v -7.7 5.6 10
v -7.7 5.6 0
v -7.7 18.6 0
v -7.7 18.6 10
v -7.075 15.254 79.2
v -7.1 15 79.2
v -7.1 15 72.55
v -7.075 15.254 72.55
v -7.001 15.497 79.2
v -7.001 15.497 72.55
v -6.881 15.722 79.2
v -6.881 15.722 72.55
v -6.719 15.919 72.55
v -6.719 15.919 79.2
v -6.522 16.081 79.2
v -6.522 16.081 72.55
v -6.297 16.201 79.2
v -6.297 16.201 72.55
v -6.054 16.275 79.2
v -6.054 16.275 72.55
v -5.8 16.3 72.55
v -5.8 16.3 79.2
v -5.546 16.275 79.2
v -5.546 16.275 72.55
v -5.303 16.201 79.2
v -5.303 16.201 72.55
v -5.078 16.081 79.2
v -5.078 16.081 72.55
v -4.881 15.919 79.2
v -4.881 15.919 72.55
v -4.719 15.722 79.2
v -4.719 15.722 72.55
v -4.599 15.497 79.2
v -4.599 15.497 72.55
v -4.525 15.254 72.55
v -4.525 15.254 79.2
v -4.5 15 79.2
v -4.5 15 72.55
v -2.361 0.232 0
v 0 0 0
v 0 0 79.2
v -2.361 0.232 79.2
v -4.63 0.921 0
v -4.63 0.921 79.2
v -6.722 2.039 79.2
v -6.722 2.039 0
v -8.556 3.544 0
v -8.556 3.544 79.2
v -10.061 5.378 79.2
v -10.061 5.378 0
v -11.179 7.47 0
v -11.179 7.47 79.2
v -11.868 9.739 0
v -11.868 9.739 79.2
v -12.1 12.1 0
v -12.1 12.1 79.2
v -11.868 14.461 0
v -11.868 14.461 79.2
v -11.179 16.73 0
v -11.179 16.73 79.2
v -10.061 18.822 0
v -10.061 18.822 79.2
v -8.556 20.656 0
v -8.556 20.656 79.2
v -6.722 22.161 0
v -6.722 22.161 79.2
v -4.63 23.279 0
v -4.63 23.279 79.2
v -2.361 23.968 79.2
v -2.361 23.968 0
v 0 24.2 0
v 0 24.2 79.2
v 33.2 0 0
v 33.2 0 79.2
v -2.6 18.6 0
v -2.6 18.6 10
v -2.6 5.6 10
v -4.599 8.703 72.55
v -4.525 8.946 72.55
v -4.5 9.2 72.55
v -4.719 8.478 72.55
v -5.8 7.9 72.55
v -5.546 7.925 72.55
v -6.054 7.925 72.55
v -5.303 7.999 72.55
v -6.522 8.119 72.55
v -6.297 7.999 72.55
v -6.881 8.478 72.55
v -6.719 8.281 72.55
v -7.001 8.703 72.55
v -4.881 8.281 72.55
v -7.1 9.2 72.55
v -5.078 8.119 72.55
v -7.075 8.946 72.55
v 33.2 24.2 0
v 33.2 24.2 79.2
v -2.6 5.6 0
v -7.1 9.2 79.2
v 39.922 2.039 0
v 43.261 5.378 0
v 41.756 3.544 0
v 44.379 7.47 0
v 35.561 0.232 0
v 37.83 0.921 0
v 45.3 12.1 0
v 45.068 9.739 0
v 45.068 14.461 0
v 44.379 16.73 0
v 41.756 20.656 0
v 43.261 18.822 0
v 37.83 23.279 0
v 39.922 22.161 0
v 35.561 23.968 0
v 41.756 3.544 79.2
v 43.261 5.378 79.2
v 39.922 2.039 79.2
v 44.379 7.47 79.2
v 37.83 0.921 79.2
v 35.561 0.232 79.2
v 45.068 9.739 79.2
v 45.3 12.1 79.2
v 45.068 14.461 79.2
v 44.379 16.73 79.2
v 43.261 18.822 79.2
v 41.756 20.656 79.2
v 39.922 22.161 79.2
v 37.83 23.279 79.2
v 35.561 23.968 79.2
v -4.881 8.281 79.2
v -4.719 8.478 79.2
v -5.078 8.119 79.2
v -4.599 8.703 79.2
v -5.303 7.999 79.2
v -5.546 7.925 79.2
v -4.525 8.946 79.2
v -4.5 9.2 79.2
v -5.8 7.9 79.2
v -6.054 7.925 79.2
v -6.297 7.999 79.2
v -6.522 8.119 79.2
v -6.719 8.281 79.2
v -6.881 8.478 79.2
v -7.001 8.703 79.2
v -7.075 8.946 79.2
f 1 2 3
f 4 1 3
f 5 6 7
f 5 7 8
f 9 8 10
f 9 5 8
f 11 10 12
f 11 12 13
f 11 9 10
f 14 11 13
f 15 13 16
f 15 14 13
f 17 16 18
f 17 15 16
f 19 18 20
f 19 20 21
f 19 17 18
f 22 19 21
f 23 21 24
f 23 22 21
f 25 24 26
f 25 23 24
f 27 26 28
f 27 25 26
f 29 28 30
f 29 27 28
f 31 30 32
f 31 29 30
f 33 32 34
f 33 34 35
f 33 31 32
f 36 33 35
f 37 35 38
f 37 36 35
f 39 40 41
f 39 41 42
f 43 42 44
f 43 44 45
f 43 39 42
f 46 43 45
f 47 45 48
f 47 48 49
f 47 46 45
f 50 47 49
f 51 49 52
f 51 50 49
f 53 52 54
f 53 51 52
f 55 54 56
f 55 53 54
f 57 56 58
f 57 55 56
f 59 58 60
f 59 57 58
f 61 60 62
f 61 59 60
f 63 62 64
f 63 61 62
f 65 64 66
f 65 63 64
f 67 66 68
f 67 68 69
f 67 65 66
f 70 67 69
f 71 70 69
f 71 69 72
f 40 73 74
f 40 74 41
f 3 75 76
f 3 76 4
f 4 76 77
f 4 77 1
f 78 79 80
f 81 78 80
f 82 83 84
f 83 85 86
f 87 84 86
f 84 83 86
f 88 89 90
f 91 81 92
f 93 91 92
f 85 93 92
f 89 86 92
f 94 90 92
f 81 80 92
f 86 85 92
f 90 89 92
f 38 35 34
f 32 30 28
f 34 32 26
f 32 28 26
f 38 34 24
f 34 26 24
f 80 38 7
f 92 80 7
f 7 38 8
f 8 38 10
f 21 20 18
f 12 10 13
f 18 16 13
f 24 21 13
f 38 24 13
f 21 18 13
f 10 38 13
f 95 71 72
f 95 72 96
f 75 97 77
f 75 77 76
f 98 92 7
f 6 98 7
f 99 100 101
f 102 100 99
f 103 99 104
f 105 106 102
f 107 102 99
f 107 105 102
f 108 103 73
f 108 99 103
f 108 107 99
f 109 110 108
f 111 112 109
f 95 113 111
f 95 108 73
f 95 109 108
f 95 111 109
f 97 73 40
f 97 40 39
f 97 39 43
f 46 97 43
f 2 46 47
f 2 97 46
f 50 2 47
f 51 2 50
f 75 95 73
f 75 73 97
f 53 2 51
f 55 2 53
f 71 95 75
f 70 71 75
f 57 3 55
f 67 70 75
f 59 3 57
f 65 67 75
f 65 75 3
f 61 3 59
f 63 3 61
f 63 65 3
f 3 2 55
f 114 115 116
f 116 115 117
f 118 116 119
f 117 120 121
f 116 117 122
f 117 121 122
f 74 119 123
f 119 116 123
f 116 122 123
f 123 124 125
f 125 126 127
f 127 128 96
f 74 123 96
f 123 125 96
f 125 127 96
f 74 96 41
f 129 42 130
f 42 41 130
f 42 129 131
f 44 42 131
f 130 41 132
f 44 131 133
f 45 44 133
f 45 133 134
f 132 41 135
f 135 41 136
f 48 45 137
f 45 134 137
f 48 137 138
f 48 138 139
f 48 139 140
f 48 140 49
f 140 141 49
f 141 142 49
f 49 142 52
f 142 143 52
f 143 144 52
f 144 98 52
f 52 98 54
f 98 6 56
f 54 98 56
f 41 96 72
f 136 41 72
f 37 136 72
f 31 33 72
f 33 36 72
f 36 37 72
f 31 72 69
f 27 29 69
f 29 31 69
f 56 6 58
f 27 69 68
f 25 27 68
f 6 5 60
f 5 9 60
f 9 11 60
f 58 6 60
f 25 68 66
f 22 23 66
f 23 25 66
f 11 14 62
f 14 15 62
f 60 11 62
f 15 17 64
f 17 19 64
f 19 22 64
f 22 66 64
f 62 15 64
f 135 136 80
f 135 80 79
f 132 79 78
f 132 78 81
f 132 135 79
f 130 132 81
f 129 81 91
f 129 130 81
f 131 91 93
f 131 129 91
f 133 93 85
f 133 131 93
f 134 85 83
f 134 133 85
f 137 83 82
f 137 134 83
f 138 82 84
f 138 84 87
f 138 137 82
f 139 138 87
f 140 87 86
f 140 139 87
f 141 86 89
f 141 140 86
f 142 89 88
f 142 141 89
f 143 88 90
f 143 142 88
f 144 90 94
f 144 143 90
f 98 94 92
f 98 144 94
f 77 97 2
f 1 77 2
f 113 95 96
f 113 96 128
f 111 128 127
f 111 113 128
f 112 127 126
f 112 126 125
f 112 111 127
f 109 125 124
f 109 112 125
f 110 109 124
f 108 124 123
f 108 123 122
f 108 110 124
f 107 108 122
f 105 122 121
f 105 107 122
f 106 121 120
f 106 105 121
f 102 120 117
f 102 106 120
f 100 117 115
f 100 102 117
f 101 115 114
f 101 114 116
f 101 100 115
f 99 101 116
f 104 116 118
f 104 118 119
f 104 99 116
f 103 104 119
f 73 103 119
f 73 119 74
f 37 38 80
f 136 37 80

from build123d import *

# Parameters (mm, degrees)
P_IDAT_VYSUNUT_M1_DEPTH  = 79.2
SKICA2_W                 = 5.1
SKICA2_H                 = 13
ODEBRAT_VYSUNUT_M1_DEPTH = 10
ODEBRAT_VYSUNUT_M2_DEPTH = 6.65


with BuildPart() as part:
    # Skica1 → Přidat vysunutím1 (new body)
    with BuildSketch(Plane.XY):
        with BuildLine():
            Line((0, 24.2), (33.2, 24.2))
            ThreePointArc((33.2, 24.2), (45.3, 12.1), (33.2, 0))
            Line((33.2, 0), (0, 0))
            ThreePointArc((0, 0), (-12.1, 12.1), (0, 24.2))
        make_face()
    extrude(amount=P_IDAT_VYSUNUT_M1_DEPTH)

    # Skica2 → Odebrat vysunutím1 (cut)
    with BuildSketch(Plane(origin=(0, 0, 0), x_dir=(-1, 0, 0), z_dir=(0, 0, -1))):
        with Locations((5.15, 12.1)):
            Rectangle(SKICA2_W, SKICA2_H)
    extrude(amount=-ODEBRAT_VYSUNUT_M1_DEPTH, mode=Mode.SUBTRACT)

    # Skica3 → Odebrat vysunutím2 (cut)
    with BuildSketch(Plane.XY.offset(79.2)):
        with BuildLine():
            Line((-7.1, 9.2), (-7.1, 15))
            ThreePointArc((-7.1, 15), (-5.8, 16.3), (-4.5, 15))
            Line((-4.5, 15), (-4.5, 9.2))
            ThreePointArc((-4.5, 9.2), (-5.8, 7.9), (-7.1, 9.2))
        make_face()
    extrude(amount=-ODEBRAT_VYSUNUT_M2_DEPTH, mode=Mode.SUBTRACT)


solid = part.part
